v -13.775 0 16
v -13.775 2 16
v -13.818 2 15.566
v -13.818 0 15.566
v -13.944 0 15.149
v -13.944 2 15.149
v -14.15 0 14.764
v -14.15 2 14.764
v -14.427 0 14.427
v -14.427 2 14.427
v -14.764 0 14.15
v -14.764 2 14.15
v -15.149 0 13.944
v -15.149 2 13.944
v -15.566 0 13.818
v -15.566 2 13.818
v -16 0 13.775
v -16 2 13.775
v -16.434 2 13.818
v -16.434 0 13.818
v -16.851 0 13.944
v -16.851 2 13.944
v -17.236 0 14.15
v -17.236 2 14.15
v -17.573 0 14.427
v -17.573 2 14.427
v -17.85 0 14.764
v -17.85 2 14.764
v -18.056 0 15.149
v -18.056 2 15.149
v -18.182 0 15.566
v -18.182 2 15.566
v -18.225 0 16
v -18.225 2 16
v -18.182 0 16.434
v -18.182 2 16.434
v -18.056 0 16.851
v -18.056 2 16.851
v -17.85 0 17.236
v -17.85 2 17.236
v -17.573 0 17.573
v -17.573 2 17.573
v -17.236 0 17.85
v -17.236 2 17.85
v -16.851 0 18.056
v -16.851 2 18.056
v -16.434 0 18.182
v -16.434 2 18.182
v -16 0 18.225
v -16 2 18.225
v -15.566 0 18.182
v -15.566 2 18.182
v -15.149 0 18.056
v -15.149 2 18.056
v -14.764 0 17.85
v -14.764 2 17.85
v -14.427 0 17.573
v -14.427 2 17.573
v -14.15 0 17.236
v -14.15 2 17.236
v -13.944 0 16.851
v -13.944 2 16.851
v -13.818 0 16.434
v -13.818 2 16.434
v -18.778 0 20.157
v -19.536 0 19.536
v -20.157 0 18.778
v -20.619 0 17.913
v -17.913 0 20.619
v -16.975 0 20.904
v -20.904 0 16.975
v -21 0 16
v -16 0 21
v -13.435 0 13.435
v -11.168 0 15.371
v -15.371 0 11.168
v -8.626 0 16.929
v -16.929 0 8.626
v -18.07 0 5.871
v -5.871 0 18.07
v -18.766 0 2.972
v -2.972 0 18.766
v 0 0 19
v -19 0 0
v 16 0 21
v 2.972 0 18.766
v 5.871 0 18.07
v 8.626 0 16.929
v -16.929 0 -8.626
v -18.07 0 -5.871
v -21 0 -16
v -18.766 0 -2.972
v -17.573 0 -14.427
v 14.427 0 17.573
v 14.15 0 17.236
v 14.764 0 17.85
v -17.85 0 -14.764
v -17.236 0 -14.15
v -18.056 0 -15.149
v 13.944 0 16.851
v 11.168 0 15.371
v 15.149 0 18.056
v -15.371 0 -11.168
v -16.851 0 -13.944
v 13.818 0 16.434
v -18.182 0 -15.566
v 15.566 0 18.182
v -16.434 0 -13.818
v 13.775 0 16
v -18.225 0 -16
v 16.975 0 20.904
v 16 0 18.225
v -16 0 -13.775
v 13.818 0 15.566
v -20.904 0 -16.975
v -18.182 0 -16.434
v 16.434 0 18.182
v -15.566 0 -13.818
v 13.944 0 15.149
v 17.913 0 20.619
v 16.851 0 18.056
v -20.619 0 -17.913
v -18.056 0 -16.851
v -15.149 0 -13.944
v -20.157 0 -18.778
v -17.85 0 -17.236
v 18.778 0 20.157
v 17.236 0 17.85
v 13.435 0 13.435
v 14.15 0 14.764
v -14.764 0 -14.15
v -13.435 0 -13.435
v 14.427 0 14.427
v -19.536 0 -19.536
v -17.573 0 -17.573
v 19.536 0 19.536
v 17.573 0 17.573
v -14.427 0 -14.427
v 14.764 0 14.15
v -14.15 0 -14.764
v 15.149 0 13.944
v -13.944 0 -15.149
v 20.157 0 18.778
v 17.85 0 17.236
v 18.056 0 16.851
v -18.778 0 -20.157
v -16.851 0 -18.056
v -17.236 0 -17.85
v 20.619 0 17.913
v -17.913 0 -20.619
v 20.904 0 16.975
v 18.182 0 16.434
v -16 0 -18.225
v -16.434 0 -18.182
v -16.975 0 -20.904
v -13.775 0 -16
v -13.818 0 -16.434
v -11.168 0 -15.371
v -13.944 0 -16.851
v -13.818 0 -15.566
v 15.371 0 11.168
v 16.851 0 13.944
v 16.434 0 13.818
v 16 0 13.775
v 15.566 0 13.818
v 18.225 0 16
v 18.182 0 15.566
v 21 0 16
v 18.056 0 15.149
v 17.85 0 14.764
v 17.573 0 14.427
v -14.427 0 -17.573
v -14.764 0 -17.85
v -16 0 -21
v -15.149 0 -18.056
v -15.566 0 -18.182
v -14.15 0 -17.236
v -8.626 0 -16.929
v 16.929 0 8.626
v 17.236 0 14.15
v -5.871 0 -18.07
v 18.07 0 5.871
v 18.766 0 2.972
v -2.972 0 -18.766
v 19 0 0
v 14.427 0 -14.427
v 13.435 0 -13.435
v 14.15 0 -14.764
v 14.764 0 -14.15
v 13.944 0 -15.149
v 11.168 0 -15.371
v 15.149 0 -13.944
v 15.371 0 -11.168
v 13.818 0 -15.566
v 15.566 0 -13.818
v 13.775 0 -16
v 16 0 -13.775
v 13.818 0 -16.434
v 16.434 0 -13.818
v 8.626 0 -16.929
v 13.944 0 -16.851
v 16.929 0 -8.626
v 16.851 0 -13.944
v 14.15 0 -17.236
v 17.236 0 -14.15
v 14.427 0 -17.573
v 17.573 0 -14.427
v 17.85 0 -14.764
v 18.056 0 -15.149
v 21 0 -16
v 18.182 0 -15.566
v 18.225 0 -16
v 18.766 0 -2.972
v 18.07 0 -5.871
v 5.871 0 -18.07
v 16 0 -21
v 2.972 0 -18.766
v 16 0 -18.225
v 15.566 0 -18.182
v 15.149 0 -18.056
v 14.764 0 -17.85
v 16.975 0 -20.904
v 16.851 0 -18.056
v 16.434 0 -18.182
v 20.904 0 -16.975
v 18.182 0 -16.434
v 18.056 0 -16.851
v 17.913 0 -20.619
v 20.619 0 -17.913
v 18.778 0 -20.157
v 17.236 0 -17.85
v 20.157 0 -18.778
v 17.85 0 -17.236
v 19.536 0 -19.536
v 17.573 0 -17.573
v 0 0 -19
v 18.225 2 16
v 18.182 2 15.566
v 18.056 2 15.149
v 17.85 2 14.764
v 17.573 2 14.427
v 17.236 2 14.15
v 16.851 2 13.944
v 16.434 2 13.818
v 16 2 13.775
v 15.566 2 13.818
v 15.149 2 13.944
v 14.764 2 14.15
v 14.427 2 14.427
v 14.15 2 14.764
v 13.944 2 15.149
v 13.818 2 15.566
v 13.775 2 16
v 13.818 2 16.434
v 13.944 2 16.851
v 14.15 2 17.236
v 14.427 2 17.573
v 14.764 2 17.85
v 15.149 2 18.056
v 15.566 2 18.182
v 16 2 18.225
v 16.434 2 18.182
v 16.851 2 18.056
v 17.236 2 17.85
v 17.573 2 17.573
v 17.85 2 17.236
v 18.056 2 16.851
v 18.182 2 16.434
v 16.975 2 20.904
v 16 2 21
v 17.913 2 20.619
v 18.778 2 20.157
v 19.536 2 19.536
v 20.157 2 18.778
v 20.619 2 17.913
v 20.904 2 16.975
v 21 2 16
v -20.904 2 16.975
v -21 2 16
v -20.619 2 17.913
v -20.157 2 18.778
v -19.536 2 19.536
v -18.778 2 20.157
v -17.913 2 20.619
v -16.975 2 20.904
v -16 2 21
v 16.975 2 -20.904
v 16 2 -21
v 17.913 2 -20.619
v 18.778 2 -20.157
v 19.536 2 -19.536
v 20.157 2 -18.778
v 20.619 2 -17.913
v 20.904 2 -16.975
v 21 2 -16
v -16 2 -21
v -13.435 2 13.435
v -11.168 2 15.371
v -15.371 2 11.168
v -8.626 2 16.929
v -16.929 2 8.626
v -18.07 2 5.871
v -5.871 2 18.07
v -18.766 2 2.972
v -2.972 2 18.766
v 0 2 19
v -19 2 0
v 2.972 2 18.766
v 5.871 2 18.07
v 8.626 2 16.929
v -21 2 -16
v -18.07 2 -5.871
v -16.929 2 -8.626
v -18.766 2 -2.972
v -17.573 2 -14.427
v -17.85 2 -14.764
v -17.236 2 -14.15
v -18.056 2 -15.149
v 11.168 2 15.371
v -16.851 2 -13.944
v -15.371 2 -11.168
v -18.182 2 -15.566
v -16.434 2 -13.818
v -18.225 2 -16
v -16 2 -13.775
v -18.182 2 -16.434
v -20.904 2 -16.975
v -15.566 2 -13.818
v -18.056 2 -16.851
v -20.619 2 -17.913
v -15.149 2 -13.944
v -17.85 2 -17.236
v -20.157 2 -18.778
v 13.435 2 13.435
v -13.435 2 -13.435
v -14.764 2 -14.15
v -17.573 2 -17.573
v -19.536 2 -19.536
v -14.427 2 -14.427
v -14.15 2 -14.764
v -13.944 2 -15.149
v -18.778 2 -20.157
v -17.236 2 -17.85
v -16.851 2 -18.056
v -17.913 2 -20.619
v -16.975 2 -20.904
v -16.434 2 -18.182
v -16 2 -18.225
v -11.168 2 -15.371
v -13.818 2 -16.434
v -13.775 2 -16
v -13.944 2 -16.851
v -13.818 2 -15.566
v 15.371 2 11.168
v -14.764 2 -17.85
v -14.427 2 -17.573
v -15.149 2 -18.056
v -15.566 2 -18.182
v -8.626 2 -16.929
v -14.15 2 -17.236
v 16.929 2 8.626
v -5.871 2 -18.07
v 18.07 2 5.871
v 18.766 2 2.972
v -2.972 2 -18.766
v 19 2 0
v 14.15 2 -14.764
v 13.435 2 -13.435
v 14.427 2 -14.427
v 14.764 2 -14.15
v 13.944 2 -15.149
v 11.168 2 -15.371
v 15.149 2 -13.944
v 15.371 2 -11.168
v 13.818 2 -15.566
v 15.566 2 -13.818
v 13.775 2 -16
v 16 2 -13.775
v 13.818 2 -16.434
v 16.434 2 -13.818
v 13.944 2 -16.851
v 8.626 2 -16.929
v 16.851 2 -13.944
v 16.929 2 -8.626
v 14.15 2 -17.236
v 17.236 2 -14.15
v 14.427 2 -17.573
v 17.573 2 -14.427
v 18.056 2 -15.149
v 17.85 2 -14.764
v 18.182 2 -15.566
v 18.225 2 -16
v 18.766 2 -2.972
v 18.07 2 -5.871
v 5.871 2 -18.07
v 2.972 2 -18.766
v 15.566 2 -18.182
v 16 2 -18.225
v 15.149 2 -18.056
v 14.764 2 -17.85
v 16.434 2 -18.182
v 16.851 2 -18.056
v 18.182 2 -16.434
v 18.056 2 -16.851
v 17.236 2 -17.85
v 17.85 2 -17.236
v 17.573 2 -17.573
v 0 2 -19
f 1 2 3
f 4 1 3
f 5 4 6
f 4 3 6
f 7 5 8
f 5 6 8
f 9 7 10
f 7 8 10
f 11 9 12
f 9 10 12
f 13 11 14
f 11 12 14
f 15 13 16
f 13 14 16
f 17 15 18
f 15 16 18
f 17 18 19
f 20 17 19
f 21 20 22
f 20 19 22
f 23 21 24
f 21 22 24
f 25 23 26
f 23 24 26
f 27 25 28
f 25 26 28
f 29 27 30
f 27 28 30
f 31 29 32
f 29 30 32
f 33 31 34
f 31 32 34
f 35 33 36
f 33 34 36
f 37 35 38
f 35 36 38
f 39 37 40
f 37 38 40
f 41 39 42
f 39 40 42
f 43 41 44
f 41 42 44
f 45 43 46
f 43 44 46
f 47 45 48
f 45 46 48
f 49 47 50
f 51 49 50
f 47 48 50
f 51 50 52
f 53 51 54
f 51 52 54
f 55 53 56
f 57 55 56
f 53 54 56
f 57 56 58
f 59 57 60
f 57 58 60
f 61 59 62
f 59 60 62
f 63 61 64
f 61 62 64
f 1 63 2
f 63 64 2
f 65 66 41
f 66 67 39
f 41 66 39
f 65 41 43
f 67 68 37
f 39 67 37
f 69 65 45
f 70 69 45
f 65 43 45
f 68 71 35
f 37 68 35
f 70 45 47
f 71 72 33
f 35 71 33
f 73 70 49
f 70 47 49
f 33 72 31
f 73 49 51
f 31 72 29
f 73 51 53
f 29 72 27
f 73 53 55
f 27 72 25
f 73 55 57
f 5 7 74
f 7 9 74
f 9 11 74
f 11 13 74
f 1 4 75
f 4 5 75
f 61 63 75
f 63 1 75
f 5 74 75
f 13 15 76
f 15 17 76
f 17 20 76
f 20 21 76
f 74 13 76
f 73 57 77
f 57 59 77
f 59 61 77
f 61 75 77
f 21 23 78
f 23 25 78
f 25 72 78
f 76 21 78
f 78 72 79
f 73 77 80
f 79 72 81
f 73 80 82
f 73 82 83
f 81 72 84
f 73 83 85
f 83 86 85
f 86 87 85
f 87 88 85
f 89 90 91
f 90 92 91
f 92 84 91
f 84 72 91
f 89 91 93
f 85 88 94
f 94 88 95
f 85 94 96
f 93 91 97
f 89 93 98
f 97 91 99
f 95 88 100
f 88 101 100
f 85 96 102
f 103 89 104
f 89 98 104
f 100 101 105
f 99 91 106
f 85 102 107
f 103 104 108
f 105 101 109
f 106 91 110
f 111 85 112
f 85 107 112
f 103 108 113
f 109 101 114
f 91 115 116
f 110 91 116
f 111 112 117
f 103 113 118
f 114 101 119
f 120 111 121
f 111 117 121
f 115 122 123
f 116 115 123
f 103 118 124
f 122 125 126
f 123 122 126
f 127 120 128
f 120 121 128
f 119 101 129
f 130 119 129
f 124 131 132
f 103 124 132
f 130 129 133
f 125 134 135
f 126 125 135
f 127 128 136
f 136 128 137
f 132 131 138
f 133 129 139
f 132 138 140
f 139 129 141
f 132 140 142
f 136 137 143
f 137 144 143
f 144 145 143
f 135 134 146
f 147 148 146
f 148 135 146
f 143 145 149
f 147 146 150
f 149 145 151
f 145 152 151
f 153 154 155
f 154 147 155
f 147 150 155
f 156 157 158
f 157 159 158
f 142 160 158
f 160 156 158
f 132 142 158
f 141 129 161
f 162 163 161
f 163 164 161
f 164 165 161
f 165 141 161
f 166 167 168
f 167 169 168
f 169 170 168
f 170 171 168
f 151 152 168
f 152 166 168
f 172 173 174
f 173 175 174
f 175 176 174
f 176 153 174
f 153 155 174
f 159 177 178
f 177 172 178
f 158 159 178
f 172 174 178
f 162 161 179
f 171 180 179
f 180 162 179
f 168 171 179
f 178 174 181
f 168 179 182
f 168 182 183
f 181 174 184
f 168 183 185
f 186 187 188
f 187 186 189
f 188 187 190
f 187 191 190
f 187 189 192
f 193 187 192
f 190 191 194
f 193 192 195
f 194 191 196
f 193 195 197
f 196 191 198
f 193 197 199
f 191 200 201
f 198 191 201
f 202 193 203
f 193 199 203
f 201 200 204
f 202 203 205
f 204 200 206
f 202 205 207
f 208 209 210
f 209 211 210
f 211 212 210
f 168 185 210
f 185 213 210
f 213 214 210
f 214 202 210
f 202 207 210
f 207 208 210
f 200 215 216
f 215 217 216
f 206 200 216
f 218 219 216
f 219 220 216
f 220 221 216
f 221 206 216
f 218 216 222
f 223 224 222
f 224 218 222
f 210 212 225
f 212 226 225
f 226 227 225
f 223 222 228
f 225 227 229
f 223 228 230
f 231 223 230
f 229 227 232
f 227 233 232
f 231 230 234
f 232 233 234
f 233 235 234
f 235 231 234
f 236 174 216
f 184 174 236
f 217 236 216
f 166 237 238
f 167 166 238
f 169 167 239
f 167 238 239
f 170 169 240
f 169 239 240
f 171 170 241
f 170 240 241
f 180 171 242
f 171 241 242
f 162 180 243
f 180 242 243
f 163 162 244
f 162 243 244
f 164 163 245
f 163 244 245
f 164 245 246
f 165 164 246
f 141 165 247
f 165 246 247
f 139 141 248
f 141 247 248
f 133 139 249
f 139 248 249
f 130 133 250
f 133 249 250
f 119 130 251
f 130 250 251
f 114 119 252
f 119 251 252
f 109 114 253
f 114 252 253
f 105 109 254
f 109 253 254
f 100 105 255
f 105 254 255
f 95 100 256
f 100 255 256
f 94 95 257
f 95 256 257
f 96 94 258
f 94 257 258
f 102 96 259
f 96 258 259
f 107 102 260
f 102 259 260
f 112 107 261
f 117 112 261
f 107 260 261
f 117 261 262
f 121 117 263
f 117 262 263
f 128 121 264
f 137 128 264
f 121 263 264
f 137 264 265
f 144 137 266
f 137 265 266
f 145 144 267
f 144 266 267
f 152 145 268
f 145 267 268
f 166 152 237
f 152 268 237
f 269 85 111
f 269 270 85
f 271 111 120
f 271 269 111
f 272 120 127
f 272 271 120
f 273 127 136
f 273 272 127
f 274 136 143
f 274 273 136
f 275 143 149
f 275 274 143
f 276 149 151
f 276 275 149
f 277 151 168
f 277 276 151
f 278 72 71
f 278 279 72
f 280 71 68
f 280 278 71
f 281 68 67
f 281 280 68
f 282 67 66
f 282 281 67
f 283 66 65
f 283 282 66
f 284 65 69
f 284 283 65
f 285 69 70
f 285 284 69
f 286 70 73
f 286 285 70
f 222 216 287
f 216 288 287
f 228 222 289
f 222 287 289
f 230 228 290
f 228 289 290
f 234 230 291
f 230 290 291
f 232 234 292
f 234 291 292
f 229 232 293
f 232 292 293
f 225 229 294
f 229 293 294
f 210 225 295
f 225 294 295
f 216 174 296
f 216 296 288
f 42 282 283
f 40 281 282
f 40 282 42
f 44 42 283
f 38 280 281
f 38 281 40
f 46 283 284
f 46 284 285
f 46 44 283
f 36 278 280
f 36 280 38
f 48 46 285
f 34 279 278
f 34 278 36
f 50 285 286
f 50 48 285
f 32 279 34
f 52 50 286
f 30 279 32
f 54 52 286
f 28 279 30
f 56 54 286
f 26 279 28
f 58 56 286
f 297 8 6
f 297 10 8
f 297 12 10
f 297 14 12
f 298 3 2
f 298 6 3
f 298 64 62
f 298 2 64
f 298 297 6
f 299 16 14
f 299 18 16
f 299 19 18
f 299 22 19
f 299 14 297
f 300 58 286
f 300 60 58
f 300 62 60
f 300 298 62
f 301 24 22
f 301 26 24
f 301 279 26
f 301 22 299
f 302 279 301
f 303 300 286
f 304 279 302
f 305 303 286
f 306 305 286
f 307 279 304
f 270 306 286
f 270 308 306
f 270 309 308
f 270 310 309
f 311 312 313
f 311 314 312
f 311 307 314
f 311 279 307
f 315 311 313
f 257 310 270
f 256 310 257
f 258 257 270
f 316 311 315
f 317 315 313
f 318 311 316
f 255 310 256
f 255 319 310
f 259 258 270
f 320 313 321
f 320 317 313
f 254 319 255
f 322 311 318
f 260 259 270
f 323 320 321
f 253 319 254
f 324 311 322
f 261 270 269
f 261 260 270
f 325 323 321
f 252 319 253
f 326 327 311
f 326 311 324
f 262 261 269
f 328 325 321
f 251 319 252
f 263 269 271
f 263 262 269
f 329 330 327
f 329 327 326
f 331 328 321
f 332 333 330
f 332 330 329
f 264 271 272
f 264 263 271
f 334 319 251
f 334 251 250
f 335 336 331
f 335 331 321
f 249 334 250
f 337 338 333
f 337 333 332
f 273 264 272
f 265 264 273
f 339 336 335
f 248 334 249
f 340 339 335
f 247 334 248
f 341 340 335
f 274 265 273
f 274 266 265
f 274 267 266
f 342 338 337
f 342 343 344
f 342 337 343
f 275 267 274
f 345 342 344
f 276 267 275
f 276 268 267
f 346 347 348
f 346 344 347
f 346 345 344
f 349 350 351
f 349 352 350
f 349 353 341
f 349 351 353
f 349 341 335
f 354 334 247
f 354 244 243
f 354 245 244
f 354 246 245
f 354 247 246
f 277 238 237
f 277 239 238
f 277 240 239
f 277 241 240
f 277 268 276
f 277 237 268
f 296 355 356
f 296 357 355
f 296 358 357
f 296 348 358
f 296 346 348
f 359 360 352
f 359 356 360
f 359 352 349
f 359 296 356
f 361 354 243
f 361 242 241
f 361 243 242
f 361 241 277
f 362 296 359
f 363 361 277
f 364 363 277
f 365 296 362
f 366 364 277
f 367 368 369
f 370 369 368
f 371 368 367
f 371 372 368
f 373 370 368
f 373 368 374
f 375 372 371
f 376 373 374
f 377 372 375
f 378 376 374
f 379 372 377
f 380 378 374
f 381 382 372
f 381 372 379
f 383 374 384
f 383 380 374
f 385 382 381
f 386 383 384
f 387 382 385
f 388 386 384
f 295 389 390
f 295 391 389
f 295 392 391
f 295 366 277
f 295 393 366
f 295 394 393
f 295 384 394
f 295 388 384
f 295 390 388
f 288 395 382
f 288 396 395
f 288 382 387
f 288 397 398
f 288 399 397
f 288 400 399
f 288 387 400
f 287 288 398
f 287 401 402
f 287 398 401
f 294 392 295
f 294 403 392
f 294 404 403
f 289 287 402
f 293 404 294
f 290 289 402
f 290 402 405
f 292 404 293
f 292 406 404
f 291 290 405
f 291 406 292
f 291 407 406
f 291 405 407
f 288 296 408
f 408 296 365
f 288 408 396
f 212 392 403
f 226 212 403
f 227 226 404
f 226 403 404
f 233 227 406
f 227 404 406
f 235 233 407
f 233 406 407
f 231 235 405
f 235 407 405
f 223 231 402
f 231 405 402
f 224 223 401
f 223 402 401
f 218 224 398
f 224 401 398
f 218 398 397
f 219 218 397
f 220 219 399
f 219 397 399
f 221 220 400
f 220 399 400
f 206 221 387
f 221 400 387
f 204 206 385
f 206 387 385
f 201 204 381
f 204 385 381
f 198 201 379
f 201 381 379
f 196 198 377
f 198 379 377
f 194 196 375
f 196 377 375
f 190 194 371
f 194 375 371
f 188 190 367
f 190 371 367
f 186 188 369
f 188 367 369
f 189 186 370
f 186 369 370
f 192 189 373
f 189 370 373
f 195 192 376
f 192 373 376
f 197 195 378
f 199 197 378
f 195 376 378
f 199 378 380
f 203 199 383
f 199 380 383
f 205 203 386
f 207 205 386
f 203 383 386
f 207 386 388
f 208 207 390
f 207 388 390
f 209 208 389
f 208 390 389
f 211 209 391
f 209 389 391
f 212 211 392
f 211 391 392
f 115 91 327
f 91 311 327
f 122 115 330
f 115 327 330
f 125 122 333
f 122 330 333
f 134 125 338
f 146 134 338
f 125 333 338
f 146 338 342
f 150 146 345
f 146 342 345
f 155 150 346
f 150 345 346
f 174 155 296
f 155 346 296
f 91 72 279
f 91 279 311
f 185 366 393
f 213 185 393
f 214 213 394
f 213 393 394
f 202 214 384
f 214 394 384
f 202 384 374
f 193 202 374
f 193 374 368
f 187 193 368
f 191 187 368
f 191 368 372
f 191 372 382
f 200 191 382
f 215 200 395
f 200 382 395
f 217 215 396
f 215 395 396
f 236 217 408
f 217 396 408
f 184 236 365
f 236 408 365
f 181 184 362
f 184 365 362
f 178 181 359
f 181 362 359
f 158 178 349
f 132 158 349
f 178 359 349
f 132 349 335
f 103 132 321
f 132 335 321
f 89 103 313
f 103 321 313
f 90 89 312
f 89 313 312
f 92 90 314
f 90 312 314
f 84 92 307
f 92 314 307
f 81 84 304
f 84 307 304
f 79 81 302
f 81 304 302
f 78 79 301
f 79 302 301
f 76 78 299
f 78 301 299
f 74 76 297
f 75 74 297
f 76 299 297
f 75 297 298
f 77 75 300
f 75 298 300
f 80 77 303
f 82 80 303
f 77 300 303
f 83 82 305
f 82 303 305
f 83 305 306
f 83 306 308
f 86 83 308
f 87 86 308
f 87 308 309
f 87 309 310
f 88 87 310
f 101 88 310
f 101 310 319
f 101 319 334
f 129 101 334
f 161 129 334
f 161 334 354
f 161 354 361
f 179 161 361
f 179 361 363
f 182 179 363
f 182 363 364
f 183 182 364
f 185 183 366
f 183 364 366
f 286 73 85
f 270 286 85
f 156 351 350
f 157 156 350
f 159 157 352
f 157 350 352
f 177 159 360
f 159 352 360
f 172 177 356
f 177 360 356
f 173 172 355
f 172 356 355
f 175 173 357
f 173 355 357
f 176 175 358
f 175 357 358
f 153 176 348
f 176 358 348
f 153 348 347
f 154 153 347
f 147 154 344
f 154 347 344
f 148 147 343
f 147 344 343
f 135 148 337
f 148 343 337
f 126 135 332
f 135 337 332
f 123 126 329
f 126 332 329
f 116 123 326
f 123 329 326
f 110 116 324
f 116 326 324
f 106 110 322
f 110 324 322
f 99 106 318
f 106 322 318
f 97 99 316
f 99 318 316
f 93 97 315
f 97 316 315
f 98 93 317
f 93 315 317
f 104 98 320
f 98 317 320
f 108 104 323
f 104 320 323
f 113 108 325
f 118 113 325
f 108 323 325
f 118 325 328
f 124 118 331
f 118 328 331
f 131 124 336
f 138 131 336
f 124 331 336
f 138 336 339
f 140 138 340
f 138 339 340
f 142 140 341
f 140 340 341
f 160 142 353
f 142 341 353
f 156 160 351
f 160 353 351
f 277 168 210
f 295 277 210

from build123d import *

# Parameters (mm, degrees)
SKETCH1_W           = 42
SKETCH1_H           = 42
BOSS_EXTRUDE1_DEPTH = 2
SKETCH2_R           = 2.225
SKETCH2_R_2         = 19
CUT_EXTRUDE1_DEPTH  = 2
FILLET1_R           = 5


with BuildPart() as part:
    # Sketch1 → Boss-Extrude1 (new body)
    with BuildSketch(Plane(origin=(0, 0, 0), x_dir=(1, 0, 0), z_dir=(0, 1, 0))):
        Rectangle(SKETCH1_W, SKETCH1_H)
    extrude(amount=BOSS_EXTRUDE1_DEPTH)

    # Sketch2 → Cut-Extrude1 (cut)
    with BuildSketch(Plane(origin=(0, 2, 0), x_dir=(1, 0, 0), z_dir=(0, 1, 0))):
        with Locations((-16, -16)):
            Circle(SKETCH2_R)
        with Locations((-16, 16)):
            Circle(SKETCH2_R)
        with Locations((16, 16)):
            Circle(SKETCH2_R)
        with Locations((16, -16)):
            Circle(SKETCH2_R)
        Circle(SKETCH2_R_2)
    extrude(amount=-CUT_EXTRUDE1_DEPTH, mode=Mode.SUBTRACT)

    # Fillet1
    fillet1_edges = [part.edges().sort_by_distance(p)[0] for p in [
        (-21, 1, 21),
        (-21, 1, -21),
        (21, 1, -21),
        (21, 1, 21),
    ]]
    fillet(fillet1_edges, radius=FILLET1_R)


solid = part.part
